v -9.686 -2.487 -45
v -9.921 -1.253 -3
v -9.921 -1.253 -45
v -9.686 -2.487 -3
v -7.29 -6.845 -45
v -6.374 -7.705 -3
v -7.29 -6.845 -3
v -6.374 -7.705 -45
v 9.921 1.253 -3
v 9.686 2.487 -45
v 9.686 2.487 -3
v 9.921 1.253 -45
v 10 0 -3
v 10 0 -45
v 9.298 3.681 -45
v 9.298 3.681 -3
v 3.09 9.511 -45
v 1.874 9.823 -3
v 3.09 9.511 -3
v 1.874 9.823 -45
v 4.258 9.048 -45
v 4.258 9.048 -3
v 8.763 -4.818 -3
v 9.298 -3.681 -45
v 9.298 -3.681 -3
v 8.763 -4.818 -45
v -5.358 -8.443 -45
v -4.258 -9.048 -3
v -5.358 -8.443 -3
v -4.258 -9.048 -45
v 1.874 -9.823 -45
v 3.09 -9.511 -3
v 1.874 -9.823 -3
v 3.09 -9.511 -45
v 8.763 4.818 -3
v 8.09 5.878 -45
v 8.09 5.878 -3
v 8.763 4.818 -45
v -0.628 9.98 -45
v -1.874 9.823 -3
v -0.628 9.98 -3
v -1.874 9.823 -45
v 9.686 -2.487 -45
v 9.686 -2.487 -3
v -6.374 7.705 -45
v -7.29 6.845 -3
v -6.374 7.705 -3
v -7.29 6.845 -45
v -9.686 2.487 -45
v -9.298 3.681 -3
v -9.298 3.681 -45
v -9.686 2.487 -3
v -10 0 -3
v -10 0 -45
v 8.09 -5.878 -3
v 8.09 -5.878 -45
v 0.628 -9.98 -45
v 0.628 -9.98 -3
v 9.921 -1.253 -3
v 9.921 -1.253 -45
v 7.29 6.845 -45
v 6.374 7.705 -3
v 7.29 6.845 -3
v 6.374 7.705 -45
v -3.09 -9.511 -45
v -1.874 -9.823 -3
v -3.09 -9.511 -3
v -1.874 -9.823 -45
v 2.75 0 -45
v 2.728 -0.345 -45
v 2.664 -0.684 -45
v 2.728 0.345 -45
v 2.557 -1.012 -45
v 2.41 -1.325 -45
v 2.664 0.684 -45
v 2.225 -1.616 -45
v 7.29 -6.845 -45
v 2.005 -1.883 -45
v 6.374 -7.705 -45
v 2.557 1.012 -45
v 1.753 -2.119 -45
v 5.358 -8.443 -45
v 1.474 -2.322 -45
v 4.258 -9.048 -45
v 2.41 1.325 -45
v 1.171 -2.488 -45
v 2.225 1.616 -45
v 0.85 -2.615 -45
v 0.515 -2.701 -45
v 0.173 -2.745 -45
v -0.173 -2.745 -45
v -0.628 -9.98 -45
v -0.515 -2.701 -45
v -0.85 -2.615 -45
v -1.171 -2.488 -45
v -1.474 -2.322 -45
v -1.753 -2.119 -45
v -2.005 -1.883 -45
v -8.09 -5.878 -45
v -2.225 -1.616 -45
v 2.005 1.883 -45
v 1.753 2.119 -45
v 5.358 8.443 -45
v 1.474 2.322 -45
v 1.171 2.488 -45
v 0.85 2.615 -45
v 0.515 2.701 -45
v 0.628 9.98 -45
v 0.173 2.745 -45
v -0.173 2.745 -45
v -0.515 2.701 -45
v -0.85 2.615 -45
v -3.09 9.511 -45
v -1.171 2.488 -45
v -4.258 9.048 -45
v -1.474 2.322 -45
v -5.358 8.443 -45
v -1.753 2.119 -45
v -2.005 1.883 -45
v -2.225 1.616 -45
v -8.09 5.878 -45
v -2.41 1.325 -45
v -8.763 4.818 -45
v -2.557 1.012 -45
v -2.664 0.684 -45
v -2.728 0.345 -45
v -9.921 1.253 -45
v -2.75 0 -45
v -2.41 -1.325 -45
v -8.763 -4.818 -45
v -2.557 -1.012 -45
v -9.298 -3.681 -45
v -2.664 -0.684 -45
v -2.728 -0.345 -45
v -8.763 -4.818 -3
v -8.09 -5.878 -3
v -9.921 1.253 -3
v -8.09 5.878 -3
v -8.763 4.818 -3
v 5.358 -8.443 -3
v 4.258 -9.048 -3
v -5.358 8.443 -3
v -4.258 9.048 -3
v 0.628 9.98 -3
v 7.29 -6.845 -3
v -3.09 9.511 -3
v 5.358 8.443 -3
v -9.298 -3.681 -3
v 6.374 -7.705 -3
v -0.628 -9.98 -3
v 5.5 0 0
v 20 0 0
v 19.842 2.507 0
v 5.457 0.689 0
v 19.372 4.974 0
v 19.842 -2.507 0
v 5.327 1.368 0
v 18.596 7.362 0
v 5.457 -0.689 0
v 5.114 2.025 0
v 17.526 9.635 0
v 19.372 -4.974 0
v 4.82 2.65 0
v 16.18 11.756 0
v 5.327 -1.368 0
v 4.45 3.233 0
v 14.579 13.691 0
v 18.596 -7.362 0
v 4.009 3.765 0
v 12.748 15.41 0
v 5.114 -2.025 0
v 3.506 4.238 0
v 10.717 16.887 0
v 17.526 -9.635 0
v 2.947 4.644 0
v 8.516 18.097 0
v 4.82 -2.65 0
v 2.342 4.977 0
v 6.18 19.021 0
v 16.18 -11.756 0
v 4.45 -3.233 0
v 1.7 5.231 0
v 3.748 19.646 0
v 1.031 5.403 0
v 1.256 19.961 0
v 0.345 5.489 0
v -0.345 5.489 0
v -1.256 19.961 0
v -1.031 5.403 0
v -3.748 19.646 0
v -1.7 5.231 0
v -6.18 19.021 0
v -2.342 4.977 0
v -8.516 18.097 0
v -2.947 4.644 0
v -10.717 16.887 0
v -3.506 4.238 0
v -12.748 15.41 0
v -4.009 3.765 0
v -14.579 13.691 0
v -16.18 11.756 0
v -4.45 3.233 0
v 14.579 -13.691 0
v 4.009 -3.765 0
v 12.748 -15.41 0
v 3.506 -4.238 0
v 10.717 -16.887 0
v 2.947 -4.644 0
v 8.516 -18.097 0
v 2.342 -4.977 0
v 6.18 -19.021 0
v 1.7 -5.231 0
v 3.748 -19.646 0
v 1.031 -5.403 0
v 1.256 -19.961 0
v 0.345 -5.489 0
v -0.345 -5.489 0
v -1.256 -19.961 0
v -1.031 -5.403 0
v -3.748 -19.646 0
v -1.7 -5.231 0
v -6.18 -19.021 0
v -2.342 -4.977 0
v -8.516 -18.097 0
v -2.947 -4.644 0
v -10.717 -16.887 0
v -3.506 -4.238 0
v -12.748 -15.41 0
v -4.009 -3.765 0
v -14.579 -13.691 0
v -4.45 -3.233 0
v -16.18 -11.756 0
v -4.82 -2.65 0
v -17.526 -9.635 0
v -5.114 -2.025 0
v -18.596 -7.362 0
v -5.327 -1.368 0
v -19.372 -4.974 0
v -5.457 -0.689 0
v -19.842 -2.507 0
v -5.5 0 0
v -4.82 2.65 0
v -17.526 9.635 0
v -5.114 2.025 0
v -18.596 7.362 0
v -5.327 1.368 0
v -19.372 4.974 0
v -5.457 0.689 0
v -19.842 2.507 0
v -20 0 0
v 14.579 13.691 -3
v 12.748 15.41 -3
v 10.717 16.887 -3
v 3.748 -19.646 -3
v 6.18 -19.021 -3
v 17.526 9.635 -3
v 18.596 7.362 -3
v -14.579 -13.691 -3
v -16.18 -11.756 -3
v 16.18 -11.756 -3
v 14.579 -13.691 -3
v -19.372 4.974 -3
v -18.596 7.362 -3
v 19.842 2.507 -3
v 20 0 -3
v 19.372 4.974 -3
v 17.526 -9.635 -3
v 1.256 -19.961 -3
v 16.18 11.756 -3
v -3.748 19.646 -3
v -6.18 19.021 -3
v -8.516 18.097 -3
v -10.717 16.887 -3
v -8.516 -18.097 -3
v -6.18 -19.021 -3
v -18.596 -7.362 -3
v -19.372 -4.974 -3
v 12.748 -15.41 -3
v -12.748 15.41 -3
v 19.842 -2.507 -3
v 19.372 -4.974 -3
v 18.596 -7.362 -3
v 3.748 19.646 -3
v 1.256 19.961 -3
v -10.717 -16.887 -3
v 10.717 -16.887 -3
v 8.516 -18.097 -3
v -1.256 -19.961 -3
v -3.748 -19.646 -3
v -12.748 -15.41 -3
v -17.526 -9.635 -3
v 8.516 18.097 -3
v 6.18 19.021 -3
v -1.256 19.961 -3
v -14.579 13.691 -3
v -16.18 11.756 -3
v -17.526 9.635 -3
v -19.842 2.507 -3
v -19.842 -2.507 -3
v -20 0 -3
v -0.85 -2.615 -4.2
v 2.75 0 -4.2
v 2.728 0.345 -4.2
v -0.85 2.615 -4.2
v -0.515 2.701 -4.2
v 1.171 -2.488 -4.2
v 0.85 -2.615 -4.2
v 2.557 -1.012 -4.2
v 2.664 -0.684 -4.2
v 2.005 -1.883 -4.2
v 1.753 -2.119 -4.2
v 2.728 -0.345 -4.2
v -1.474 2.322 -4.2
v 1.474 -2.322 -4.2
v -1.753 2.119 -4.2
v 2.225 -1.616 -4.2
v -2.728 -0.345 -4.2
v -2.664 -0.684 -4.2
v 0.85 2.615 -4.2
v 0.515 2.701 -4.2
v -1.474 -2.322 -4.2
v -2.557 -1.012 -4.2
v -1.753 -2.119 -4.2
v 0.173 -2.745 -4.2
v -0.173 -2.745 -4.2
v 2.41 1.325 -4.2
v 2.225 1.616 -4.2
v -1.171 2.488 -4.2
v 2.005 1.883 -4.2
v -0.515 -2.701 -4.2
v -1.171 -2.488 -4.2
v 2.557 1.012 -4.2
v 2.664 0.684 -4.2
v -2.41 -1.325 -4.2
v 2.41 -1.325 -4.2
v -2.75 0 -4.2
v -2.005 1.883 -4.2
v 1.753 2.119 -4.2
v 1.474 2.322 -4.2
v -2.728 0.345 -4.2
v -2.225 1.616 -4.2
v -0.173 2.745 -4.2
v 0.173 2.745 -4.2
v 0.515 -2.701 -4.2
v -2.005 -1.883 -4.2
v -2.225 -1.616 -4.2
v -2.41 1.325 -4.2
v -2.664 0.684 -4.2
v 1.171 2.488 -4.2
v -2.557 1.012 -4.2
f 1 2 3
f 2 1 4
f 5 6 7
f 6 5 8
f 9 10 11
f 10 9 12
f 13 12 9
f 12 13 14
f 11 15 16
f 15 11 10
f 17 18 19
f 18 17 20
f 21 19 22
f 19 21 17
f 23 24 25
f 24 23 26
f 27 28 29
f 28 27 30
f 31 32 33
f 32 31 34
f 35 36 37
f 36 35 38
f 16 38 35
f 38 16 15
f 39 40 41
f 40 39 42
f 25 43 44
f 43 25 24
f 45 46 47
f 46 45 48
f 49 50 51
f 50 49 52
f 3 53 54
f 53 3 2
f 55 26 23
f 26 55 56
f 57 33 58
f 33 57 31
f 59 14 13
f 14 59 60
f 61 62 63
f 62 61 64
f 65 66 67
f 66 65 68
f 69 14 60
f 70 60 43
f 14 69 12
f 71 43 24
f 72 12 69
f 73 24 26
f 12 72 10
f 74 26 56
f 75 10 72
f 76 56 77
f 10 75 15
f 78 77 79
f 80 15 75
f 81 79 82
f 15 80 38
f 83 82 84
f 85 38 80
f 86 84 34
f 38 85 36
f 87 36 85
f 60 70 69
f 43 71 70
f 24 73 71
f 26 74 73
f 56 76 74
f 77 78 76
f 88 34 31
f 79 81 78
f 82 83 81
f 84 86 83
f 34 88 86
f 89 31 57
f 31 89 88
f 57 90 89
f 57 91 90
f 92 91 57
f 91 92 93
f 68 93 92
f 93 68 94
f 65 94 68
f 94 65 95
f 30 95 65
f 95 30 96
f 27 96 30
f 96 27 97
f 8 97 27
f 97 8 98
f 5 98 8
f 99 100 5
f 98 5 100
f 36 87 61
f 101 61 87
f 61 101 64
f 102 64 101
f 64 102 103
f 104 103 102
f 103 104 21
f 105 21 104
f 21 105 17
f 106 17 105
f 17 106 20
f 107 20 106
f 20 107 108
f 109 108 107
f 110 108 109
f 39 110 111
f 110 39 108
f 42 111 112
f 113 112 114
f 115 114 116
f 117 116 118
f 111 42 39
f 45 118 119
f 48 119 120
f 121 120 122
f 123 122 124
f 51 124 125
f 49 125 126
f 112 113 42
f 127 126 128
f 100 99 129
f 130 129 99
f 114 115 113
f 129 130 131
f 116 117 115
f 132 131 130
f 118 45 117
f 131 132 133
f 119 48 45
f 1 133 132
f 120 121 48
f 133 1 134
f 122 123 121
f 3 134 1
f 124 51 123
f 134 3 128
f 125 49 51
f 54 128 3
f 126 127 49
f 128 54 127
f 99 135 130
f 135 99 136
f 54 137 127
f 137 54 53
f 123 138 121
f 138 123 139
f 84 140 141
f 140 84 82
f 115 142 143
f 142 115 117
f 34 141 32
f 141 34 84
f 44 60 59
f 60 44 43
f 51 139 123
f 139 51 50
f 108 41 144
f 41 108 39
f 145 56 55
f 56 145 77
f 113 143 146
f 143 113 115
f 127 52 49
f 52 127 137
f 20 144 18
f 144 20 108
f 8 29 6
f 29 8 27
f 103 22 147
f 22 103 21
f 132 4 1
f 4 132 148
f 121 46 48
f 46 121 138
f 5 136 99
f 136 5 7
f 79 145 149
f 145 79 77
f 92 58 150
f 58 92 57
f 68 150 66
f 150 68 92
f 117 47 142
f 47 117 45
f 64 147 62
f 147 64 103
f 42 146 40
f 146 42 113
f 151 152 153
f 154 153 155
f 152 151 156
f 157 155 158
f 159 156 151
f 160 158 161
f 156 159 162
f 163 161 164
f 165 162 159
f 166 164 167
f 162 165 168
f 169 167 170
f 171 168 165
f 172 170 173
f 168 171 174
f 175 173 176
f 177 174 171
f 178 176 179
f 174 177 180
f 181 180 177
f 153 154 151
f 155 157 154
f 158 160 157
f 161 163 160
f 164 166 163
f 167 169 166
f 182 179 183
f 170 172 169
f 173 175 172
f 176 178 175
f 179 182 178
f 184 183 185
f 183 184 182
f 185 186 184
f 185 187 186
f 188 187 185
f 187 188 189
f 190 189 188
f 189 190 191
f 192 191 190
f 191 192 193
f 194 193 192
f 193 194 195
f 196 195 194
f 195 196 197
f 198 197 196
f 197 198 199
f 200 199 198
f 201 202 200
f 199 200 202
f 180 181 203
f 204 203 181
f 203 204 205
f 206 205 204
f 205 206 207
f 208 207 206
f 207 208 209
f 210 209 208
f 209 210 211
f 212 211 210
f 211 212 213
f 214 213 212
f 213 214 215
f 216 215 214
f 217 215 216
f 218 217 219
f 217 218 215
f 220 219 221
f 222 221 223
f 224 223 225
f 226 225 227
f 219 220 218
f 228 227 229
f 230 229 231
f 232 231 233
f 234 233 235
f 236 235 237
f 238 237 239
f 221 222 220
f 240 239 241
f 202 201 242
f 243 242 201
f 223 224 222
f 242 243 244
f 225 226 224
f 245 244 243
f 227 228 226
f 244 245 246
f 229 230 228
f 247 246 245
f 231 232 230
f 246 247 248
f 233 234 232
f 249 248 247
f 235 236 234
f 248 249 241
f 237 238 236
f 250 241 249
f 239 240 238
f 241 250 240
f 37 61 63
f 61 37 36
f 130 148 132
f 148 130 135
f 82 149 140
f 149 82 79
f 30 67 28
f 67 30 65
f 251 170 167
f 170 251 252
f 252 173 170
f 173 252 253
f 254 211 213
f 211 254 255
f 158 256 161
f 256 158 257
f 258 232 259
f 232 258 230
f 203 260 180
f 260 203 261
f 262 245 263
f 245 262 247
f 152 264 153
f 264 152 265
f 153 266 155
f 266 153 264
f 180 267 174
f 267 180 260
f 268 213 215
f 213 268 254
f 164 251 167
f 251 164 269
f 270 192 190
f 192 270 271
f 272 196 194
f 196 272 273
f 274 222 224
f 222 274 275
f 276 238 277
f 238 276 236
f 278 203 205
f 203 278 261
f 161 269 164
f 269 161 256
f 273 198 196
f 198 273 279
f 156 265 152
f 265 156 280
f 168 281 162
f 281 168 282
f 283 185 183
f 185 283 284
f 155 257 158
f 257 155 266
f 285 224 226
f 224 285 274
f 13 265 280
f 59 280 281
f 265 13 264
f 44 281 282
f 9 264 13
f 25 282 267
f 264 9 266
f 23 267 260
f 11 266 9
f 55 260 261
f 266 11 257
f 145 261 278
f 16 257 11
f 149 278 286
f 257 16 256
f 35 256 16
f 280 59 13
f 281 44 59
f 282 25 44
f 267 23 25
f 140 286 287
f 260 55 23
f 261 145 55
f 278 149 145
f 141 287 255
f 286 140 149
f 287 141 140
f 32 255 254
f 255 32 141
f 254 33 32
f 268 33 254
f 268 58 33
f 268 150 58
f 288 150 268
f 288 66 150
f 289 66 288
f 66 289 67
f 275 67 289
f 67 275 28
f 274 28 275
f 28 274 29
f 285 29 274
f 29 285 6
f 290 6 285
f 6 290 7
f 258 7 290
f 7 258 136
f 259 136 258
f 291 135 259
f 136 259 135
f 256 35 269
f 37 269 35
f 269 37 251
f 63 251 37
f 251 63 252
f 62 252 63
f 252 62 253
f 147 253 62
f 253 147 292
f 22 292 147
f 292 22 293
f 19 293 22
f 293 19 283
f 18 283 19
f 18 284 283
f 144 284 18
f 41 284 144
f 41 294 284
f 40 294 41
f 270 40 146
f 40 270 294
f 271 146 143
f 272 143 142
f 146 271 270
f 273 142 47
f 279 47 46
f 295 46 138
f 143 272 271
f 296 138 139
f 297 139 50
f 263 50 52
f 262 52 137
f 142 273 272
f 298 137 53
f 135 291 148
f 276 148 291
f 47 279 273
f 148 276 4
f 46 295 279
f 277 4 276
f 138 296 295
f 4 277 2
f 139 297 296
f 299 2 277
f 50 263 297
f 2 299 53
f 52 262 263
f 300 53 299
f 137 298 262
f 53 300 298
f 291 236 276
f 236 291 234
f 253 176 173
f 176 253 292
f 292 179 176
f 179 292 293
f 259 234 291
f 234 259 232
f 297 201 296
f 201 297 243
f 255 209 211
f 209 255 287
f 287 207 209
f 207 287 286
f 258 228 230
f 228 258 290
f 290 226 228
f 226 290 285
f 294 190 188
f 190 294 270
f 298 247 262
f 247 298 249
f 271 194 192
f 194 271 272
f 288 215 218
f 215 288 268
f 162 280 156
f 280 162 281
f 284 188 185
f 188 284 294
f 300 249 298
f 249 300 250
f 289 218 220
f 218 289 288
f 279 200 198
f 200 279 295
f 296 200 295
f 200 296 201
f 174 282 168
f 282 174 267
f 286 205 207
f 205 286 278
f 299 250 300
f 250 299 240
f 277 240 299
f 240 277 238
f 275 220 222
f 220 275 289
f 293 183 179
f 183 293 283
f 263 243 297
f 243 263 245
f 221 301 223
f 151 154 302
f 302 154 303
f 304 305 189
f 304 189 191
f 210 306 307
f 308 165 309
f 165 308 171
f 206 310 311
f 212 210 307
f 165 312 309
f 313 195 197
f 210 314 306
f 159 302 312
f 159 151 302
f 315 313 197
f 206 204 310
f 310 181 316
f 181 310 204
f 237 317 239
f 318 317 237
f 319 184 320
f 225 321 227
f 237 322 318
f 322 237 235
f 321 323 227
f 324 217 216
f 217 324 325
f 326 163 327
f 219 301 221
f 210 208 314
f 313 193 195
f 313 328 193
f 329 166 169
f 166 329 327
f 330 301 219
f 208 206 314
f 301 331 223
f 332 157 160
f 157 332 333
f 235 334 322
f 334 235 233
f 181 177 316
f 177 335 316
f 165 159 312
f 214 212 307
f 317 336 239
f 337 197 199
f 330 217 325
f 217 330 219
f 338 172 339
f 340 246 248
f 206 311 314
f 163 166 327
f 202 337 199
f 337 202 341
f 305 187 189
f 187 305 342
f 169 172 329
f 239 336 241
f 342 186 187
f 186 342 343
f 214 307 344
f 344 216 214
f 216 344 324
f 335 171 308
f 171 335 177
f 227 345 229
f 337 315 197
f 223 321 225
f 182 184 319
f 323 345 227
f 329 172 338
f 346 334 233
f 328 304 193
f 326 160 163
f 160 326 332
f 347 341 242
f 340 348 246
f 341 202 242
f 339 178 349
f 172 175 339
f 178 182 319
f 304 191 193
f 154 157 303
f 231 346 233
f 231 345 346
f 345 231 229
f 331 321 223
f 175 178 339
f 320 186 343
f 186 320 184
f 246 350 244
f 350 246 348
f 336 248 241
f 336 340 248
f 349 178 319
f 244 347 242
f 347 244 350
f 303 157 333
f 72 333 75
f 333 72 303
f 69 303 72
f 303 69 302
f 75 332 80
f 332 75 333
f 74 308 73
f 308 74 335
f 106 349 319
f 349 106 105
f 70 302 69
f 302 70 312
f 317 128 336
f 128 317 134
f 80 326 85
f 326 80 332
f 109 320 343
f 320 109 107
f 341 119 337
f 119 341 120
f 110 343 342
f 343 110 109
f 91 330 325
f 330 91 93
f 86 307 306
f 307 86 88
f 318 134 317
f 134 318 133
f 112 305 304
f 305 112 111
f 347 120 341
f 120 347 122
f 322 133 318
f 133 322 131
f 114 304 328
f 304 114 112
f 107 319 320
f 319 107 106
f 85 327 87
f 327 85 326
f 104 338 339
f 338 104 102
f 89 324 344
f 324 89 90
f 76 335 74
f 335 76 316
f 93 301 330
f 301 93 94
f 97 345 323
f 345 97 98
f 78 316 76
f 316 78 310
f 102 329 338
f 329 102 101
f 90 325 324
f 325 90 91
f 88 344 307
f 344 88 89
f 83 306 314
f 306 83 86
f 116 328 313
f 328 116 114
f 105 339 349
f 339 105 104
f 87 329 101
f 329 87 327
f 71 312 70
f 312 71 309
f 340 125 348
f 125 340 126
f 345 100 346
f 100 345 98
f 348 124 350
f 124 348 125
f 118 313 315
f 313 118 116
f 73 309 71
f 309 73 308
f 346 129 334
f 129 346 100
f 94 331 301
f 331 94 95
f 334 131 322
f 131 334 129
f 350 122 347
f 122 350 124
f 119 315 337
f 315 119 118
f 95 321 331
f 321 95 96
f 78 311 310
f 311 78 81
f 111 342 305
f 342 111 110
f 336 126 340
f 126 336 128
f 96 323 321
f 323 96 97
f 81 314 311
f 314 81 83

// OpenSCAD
$fn = 50;


difference() {
	union() {
		translate(v = [0, 0, -45.0000000000]) {
			cylinder(h = 45, r = 10.0000000000);
		}
		translate(v = [0, 0, -3.0000000000]) {
			cylinder(h = 3, r = 20.0000000000);
		}
	}
	union() {
		translate(v = [0, 0, 0]) {
			rotate(a = [0, 0, 0]) {
				difference() {
					union() {
						#translate(v = [0, 0, -45.0000000000]) {
							cylinder(h = 45, r = 2.2500000000);
						}
						#translate(v = [0, 0, -4.2000000000]) {
							cylinder(h = 4.2000000000, r1 = 2.7500000000, r2 = 5.5000000000);
						}
						#translate(v = [0, 0, -45.0000000000]) {
							cylinder(h = 45, r = 2.7500000000);
						}
						#translate(v = [0, 0, -45.0000000000]) {
							cylinder(h = 45, r = 2.2500000000);
						}
					}
					union();
				}
			}
		}
	}
}
